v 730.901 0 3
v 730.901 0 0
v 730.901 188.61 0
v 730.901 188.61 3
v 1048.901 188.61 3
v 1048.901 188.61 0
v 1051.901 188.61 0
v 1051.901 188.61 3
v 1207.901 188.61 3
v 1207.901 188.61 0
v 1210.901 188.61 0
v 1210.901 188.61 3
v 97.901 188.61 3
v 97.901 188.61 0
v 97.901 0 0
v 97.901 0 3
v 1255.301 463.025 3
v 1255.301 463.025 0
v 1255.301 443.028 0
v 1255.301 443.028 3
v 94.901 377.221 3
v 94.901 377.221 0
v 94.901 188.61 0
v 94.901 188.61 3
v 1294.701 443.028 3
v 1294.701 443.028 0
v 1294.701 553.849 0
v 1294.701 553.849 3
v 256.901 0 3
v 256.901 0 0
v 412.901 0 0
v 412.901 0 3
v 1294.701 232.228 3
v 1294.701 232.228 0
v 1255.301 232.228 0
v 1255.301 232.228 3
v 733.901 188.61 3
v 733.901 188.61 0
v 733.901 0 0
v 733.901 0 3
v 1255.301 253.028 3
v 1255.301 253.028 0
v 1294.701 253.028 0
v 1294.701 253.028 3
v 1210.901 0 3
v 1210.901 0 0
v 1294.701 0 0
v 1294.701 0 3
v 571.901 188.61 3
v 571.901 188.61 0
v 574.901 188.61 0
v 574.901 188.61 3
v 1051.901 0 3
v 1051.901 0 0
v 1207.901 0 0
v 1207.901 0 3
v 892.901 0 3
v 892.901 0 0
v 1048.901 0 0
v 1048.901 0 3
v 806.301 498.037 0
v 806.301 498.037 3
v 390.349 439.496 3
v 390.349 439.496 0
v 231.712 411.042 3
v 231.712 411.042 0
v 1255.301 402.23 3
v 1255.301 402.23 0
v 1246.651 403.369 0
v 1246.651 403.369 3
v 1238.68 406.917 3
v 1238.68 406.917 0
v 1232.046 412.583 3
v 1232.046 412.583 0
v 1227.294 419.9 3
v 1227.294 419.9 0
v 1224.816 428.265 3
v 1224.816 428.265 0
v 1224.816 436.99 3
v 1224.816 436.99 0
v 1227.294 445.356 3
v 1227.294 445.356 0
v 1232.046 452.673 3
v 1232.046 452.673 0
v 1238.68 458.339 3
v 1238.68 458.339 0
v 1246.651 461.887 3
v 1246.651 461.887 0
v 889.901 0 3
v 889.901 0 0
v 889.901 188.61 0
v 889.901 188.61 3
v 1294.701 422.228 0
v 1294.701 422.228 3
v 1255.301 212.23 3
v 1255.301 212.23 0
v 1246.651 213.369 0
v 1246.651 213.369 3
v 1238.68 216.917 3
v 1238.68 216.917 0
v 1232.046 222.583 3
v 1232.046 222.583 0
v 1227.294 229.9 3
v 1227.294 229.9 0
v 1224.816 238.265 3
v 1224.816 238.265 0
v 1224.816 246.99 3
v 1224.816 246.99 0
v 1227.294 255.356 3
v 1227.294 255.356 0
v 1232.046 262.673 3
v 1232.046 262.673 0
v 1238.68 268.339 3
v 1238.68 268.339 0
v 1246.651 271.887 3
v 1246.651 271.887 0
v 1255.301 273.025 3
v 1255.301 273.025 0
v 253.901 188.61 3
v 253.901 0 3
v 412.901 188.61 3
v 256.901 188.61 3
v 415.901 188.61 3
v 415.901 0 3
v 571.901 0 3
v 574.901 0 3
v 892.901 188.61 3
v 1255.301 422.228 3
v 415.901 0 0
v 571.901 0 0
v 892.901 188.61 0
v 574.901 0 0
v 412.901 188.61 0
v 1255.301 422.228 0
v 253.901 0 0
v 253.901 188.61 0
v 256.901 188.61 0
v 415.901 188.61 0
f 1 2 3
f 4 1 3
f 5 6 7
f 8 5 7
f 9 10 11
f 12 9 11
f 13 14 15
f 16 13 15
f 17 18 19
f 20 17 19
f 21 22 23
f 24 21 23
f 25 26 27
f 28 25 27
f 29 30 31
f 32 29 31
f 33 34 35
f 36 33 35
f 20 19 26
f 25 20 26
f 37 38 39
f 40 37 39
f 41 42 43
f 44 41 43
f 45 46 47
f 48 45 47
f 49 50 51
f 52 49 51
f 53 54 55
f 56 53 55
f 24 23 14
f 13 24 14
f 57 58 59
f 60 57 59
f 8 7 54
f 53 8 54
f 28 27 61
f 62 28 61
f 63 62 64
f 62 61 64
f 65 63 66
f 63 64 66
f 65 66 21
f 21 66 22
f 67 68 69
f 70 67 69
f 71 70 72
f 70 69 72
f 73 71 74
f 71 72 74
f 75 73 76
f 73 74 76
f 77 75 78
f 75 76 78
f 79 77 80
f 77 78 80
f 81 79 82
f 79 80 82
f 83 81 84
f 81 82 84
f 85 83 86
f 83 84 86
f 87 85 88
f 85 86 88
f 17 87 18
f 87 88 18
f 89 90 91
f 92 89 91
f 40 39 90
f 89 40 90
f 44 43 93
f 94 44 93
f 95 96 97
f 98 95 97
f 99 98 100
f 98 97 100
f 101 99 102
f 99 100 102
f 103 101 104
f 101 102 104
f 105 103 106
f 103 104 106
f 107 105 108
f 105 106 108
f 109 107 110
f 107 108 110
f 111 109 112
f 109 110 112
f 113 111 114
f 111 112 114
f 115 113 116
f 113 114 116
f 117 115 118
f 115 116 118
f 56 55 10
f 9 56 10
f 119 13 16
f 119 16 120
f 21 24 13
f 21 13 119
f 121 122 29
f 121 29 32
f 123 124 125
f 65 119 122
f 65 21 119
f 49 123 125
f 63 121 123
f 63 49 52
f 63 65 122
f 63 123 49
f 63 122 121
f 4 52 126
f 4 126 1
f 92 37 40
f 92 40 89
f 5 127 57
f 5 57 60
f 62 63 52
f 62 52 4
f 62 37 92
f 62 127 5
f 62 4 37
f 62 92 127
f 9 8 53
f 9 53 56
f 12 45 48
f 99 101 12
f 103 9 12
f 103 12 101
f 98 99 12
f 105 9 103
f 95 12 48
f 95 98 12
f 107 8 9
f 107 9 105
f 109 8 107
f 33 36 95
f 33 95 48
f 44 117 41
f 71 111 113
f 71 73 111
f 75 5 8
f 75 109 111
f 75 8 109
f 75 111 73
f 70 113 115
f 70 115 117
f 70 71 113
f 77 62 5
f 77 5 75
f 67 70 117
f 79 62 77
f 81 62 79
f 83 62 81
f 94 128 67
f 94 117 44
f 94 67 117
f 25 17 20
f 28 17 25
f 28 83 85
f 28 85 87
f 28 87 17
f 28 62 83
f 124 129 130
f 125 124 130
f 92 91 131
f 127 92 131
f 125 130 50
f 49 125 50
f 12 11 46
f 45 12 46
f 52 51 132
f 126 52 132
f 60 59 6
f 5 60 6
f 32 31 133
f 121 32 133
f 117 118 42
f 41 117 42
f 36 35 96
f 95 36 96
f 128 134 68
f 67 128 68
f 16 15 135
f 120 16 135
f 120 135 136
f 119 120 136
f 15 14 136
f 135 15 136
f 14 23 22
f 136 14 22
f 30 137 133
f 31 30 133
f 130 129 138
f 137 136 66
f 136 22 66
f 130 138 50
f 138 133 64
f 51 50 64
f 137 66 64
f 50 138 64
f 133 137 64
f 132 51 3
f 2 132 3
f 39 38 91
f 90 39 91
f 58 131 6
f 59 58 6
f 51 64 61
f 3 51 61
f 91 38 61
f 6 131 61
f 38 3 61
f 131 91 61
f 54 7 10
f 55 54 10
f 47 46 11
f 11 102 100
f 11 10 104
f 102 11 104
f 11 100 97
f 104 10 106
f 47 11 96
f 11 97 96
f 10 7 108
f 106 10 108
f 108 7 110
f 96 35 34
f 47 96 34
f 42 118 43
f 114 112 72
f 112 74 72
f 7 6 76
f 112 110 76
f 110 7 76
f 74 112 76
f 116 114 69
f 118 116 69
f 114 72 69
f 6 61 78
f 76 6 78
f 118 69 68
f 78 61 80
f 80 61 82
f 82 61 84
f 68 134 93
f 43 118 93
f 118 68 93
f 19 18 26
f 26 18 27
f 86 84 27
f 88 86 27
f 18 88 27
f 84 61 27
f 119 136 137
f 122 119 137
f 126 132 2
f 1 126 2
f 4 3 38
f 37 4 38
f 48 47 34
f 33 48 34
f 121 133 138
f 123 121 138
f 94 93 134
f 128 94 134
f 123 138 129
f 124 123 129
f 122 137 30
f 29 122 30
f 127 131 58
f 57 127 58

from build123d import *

# Parameters (mm, degrees)
BOSS_EXTRUDE1_DEPTH = 3


with BuildPart() as part:
    # Model → Boss-Extrude1 (new body)
    with BuildSketch(Plane.XY):
        with BuildLine():
            Line((1255.301037795, 443.027781841), (1294.701037823, 443.027781841))
            Line((1294.701037823, 443.027781841), (1294.701037823, 553.849315832))
            add(Edge.make_bspline(
                [(1294.701037823, 553.849315832), (987.9659757, 523.139532485), (557.602899882, 467.780280961), (240.864040275, 415.199018527), (137.973344874, 389.690933183), (94.901037796, 377.220662508)],
                knots=[0.108777165, 0.108777165, 0.108777165, 0.108777165, 0.189662497, 0.216203451, 0.238160454, 0.238160454, 0.238160454, 0.238160454], degree=3))
            Line((94.901037796, 377.220662508), (94.901037796, 188.610331254))
            Line((94.901037796, 188.610331254), (97.901037796, 188.610331254))
            Line((97.901037796, 188.610331254), (97.901037796, 0))
            Line((97.901037796, 0), (253.901037796, 0))
            Line((253.901037796, 0), (253.901037796, 188.610331254))
            Line((253.901037796, 188.610331254), (256.901037795, 188.610331254))
            Line((256.901037795, 188.610331254), (256.901037795, 0))
            Line((256.901037795, 0), (412.901037795, 0))
            Line((412.901037795, 0), (412.901037795, 188.610331254))
            Line((412.901037795, 188.610331254), (415.901037795, 188.610331254))
            Line((415.901037795, 188.610331254), (415.901037795, 0))
            Line((415.901037795, 0), (571.901037795, 0))
            Line((571.901037795, 0), (571.901037795, 188.610331254))
            Line((571.901037795, 188.610331254), (574.901037795, 188.610331254))
            Line((574.901037795, 188.610331254), (574.901037795, 0))
            Line((574.901037795, 0), (730.901037795, 0))
            Line((730.901037795, 0), (730.901037795, 188.610331254))
            Line((730.901037795, 188.610331254), (733.901037795, 188.610331254))
            Line((733.901037795, 188.610331254), (733.901037795, 0))
            Line((733.901037795, 0), (889.901037795, 0))
            Line((889.901037795, 0), (889.901037795, 188.610331254))
            Line((889.901037795, 188.610331254), (892.901037795, 188.610331254))
            Line((892.901037795, 188.610331254), (892.901037795, 0))
            Line((892.901037795, 0), (1048.901037796, 0))
            Line((1048.901037796, 0), (1048.901037796, 188.610331254))
            Line((1048.901037796, 188.610331254), (1051.901037795, 188.610331254))
            Line((1051.901037795, 188.610331254), (1051.901037795, 0))
            Line((1051.901037795, 0), (1207.901037796, 0))
            Line((1207.901037796, 0), (1207.901037796, 188.610331254))
            Line((1207.901037796, 188.610331254), (1210.901037796, 188.610331254))
            Line((1210.901037796, 188.610331254), (1210.901037796, 0))
            Line((1210.901037796, 0), (1294.701037796, 0))
            Line((1294.701037796, 0), (1294.701037796, 232.227781841))
            Line((1294.701037796, 232.227781841), (1255.301037795, 232.227781841))
            Line((1255.301037795, 232.227781841), (1255.301037795, 212.230413534))
            ThreePointArc((1255.301037795, 212.230413534), (1224.501037792, 242.627781841), (1255.301037795, 273.025150148))
            Line((1255.301037795, 273.025150148), (1255.301037795, 253.027781841))
            Line((1255.301037795, 253.027781841), (1294.701037796, 253.027781841))
            Line((1294.701037796, 253.027781841), (1294.701037796, 422.227781841))
            Line((1294.701037796, 422.227781841), (1255.301037795, 422.227781841))
            Line((1255.301037795, 422.227781841), (1255.301037795, 402.230413534))
            ThreePointArc((1255.301037795, 402.230413534), (1224.501037792, 432.627781841), (1255.301037795, 463.025150148))
            Line((1255.301037795, 463.025150148), (1255.301037795, 443.027781841))
        make_face()
    extrude(amount=BOSS_EXTRUDE1_DEPTH)


solid = part.part
